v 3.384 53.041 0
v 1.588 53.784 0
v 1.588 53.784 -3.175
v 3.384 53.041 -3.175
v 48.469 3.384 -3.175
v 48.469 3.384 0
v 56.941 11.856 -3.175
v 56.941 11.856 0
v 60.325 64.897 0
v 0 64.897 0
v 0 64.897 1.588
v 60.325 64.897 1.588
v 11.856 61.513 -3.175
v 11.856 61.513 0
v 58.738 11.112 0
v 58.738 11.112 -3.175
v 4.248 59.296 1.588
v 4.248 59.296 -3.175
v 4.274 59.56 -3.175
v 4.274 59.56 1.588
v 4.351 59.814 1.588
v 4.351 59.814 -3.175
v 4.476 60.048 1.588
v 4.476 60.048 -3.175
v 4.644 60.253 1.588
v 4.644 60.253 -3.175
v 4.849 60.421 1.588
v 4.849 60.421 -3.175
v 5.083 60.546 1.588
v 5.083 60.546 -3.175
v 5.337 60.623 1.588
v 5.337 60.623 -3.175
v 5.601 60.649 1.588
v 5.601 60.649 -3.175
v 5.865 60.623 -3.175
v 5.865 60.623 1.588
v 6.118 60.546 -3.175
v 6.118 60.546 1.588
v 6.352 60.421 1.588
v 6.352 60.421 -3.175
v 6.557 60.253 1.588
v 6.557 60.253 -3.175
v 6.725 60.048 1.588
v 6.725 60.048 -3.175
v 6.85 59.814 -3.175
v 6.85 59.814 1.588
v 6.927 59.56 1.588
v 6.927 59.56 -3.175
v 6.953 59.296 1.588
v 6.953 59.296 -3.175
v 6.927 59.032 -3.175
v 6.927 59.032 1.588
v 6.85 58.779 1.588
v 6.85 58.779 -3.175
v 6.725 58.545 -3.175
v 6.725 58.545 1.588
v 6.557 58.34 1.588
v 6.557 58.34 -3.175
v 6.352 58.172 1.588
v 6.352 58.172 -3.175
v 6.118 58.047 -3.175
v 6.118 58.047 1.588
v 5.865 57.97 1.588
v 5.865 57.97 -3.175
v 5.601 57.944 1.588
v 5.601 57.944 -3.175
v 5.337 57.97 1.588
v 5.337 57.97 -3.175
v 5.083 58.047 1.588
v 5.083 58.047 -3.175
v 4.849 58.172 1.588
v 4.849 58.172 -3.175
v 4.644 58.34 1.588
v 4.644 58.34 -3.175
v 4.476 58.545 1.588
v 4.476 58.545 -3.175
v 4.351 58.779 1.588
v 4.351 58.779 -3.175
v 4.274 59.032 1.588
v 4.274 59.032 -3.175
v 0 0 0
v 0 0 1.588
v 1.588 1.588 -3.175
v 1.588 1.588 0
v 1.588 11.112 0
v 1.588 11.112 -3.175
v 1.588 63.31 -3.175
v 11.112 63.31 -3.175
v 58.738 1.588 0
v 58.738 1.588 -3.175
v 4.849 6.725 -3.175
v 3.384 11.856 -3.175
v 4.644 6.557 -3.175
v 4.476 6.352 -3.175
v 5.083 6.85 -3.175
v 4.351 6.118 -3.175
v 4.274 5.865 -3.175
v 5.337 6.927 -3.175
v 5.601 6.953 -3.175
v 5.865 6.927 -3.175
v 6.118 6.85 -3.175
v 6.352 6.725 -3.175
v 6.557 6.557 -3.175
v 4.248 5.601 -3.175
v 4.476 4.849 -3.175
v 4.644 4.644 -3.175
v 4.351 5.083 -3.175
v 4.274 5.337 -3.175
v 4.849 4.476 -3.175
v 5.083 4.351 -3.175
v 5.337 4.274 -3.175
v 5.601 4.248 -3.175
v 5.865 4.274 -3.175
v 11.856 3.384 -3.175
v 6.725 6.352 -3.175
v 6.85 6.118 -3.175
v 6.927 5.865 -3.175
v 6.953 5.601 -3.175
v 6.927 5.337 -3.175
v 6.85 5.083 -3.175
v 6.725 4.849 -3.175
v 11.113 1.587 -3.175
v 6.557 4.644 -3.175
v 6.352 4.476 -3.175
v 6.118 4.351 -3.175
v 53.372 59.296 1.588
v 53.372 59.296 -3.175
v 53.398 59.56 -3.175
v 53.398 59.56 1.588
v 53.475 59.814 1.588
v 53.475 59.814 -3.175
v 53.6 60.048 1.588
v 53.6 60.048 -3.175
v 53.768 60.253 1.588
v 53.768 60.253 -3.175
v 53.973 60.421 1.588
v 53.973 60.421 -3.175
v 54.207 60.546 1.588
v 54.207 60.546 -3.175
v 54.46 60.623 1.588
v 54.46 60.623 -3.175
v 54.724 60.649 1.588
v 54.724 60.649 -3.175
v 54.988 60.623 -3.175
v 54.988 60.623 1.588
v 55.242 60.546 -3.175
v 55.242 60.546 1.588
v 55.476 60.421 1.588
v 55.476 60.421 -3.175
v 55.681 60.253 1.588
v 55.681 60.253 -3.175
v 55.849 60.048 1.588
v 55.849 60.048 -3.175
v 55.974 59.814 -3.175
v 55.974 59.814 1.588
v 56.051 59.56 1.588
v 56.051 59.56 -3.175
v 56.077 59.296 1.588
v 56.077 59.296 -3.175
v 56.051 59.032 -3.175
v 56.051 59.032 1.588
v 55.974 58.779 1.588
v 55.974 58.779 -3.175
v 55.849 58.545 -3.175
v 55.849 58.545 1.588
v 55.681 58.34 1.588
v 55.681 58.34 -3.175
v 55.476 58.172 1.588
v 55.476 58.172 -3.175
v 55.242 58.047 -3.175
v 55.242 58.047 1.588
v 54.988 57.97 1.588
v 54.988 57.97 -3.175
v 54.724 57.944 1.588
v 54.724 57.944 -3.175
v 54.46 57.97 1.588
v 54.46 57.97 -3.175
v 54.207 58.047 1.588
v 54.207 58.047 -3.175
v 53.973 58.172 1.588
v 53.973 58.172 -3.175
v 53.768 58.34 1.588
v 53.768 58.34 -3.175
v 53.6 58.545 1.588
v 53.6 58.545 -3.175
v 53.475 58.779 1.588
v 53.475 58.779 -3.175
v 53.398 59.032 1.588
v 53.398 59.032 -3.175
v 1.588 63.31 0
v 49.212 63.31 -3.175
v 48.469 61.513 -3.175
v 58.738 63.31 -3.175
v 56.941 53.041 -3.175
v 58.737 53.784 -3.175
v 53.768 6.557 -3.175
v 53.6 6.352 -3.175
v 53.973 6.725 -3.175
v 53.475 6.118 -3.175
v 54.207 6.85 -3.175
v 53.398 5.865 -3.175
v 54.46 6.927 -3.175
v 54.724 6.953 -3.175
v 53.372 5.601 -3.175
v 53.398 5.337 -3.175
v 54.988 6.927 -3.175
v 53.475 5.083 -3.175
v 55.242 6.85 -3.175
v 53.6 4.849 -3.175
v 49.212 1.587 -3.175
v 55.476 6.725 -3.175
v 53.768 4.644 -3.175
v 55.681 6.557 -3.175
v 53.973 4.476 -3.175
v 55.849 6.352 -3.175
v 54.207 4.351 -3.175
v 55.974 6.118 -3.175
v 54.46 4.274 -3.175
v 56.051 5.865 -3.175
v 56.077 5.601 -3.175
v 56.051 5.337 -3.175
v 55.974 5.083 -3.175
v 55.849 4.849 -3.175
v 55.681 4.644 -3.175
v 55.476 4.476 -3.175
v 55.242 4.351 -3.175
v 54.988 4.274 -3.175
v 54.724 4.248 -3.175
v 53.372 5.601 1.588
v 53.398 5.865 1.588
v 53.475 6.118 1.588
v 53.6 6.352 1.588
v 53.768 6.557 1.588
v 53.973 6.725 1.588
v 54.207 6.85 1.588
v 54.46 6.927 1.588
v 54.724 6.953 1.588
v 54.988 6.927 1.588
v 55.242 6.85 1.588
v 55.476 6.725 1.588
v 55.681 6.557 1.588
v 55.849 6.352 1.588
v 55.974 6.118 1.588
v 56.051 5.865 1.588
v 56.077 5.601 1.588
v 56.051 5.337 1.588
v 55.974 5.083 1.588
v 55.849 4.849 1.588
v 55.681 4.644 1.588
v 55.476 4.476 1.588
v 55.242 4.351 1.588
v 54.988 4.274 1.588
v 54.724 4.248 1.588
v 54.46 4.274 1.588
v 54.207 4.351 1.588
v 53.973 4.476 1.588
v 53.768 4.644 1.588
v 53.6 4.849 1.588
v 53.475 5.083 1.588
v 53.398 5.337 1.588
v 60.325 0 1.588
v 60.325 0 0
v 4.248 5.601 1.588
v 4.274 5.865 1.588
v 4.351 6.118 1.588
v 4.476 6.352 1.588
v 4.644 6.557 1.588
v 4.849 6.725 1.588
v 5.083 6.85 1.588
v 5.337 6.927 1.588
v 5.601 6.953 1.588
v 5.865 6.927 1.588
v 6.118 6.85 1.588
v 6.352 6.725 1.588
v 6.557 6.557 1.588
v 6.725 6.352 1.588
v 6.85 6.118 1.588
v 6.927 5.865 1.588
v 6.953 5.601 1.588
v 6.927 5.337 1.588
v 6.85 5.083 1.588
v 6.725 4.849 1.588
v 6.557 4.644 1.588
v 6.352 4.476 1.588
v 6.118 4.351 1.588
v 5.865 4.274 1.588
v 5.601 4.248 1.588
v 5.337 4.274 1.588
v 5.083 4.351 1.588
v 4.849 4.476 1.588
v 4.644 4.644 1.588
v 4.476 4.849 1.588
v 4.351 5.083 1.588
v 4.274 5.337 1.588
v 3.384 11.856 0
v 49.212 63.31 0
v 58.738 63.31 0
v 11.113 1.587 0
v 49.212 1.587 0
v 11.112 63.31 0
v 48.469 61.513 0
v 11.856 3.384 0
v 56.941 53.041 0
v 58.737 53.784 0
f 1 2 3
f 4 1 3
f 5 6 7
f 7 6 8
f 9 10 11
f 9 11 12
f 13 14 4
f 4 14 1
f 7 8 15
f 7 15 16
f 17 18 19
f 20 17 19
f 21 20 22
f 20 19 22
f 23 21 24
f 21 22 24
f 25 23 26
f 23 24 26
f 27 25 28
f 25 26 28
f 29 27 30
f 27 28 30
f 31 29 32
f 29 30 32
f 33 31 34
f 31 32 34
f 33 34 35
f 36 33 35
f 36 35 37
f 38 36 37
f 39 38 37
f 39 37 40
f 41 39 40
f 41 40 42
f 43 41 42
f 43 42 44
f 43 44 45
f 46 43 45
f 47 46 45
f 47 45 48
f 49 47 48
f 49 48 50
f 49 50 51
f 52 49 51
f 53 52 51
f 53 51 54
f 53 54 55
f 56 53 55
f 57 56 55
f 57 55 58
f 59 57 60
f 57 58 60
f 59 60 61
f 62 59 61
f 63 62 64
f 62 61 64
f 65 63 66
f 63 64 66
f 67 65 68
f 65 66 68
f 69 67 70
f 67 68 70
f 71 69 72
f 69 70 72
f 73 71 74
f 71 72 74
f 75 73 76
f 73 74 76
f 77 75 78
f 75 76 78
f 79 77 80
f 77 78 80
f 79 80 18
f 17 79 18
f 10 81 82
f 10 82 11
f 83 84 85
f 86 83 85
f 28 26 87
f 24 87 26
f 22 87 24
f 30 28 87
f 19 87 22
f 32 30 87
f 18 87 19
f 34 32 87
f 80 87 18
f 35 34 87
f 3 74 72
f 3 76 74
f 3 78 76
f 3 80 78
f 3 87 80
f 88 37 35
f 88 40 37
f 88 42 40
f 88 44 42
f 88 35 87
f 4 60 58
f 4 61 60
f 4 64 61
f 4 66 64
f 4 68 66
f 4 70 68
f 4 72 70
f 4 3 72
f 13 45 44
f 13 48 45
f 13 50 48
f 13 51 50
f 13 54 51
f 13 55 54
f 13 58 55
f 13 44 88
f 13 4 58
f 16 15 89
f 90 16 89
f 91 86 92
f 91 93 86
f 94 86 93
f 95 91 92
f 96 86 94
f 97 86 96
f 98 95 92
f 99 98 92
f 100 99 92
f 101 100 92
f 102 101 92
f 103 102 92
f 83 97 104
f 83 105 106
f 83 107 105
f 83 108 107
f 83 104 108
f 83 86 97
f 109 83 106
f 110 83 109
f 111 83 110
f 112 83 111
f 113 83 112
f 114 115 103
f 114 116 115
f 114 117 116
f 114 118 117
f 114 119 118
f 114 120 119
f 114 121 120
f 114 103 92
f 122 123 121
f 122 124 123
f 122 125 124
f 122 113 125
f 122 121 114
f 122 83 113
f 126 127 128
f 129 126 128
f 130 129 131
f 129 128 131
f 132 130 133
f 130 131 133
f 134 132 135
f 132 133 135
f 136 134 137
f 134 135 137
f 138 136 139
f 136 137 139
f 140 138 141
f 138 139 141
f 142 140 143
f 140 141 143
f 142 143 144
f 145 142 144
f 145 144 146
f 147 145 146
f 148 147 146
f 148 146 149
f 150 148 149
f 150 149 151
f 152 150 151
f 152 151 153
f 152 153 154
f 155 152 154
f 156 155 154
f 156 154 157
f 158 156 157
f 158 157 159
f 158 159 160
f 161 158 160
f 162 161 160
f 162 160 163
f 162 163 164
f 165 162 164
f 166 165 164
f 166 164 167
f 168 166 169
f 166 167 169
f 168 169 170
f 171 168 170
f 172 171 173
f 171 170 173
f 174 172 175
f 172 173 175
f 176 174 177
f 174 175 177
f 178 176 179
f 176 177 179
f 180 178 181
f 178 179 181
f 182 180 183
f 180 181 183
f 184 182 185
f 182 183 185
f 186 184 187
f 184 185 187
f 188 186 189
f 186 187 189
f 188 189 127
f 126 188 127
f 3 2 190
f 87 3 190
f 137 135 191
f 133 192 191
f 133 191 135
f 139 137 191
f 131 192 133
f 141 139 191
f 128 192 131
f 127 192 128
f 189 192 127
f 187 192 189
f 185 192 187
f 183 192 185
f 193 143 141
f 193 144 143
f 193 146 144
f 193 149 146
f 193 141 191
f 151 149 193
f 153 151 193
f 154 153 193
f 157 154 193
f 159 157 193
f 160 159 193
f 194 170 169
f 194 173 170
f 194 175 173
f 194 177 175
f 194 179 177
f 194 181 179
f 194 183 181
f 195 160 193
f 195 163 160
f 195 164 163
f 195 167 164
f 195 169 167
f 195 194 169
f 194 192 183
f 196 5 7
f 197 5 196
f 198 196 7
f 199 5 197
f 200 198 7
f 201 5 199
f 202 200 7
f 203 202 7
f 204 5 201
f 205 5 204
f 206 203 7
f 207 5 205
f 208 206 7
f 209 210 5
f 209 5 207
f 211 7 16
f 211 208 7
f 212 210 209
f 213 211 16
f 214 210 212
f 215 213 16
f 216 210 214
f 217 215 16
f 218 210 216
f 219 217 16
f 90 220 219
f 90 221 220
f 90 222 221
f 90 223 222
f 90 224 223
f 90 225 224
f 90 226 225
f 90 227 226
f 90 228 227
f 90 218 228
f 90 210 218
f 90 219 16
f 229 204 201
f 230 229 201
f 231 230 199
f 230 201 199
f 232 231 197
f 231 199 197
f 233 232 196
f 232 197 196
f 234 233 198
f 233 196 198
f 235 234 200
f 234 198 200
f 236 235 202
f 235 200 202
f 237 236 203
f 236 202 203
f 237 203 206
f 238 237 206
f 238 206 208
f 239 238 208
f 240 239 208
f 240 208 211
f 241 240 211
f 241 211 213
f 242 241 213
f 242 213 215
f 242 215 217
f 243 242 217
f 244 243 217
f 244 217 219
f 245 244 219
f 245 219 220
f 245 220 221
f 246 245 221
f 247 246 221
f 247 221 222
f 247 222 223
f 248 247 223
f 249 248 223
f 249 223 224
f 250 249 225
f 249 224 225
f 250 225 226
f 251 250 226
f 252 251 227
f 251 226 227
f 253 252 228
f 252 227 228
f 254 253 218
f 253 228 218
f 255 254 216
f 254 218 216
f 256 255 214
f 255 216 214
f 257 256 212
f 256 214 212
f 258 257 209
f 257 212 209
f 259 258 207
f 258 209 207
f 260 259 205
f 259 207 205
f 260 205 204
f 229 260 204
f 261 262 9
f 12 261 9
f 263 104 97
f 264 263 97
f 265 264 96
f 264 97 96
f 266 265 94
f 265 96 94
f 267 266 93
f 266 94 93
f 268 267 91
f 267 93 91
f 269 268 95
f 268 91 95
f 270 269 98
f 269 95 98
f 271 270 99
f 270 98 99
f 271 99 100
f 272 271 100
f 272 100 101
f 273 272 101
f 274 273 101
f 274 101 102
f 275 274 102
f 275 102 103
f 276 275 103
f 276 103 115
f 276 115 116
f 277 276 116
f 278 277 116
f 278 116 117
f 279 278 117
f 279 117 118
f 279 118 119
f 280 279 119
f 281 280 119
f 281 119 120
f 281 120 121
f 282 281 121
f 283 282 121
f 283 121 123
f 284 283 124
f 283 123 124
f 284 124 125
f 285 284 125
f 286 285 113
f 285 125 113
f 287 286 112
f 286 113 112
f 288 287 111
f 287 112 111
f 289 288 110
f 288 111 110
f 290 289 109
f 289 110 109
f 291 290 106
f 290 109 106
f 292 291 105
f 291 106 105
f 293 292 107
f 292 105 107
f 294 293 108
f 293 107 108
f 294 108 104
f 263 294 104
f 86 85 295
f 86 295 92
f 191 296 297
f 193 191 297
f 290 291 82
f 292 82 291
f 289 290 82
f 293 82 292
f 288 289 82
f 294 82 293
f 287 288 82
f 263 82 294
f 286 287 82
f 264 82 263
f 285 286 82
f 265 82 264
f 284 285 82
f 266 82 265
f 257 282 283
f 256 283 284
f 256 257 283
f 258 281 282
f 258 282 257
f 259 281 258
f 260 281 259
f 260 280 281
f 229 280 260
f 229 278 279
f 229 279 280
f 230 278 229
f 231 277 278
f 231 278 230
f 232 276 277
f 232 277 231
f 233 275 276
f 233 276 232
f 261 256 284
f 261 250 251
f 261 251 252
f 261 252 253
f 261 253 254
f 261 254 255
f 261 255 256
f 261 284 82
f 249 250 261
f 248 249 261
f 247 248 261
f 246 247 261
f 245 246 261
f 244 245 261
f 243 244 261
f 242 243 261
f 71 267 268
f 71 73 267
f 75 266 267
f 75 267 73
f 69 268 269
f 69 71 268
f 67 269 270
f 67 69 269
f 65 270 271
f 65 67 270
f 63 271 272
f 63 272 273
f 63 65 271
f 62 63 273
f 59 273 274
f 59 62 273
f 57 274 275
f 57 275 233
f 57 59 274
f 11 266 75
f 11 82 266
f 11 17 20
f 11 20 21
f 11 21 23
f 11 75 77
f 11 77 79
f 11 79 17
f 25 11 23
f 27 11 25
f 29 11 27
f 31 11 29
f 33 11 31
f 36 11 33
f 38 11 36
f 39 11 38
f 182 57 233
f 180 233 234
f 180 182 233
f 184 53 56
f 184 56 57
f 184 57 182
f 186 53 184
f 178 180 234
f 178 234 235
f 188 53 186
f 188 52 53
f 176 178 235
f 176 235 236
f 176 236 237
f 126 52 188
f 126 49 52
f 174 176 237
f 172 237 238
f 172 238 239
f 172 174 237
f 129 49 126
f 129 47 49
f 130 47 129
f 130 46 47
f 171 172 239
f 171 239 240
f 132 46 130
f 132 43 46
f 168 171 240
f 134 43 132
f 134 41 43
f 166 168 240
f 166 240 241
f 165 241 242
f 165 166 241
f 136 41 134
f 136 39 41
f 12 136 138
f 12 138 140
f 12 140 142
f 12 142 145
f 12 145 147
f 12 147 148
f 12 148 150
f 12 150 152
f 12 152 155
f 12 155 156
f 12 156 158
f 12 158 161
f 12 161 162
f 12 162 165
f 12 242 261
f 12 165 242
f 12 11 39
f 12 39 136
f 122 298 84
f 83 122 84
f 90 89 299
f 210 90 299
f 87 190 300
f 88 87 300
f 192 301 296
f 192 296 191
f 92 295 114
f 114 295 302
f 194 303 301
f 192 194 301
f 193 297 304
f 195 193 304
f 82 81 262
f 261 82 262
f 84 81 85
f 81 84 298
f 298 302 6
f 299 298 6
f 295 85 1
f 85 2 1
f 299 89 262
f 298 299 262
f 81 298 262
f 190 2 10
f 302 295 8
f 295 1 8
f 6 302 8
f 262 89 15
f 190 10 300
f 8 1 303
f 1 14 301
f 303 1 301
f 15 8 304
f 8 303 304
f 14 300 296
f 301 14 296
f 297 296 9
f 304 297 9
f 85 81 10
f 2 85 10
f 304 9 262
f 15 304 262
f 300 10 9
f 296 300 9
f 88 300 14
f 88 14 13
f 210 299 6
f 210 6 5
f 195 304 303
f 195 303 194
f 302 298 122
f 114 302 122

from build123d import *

# Parameters (mm, degrees)
F0_W     = 60.325
F0_H     = 64.897
F1_DEPTH = 1.5875
F3_DEPTH = 3.175
F5_DEPTH = 3.175
F7_D     = 2.7051
F8_SIZE  = 2.54


with BuildPart() as f1:
    # F0 (on Top) → F1 (new body)
    with BuildSketch(Plane.XY):
        with Locations((30.1625, 32.4485)):
            Rectangle(F0_W, F0_H)
    extrude(amount=F1_DEPTH)

    # F2 (on face) → F3 (join)
    with BuildSketch(Plane(origin=(0, 0, 0), x_dir=(1, 0, 0), z_dir=(0, 0, -1))):
        Polygon((58.7375, -63.3095), (58.7375, -51.2445), (46.6725, -63.3095), align=None)
        Polygon((58.7375, -1.5875), (46.6725, -1.5875), (58.7375, -13.6525), align=None)
    extrude(amount=F3_DEPTH)

    # F4 (on face) → F5 (join)
    with BuildSketch(Plane(origin=(0, 0, 0), x_dir=(1, 0, 0), z_dir=(0, 0, -1))):
        Polygon((13.6525, -1.5875), (1.5875, -1.5875), (1.5875, -13.6525), align=None)
        Polygon((1.5875, -51.2445), (1.5875, -63.3095), (13.6525, -63.3095), align=None)
    extrude(amount=F5_DEPTH)

    # F7 (through all)
    with Locations(Plane.XY.offset(1.5875)):
        with Locations((54.7243, 59.2963), (54.7243, 5.6007), (5.6007, 5.6007), (5.6007, 59.2963)):
            Hole(F7_D / 2)

    # F8
    f8_edges = [f1.edges().sort_by_distance(p)[0] for p in [
        (46.6725, 1.5875, -1.5875),
        (58.7375, 13.6525, -1.5875),
        (58.7375, 51.2445, -1.5875),
        (46.6725, 63.3095, -1.5875),
        (13.6525, 1.5875, -1.5875),
        (1.5875, 13.6525, -1.5875),
        (1.5875, 51.2445, -1.5875),
        (13.6525, 63.3095, -1.5875),
    ]]
    chamfer(f8_edges, length=F8_SIZE)


solid = f1.part
